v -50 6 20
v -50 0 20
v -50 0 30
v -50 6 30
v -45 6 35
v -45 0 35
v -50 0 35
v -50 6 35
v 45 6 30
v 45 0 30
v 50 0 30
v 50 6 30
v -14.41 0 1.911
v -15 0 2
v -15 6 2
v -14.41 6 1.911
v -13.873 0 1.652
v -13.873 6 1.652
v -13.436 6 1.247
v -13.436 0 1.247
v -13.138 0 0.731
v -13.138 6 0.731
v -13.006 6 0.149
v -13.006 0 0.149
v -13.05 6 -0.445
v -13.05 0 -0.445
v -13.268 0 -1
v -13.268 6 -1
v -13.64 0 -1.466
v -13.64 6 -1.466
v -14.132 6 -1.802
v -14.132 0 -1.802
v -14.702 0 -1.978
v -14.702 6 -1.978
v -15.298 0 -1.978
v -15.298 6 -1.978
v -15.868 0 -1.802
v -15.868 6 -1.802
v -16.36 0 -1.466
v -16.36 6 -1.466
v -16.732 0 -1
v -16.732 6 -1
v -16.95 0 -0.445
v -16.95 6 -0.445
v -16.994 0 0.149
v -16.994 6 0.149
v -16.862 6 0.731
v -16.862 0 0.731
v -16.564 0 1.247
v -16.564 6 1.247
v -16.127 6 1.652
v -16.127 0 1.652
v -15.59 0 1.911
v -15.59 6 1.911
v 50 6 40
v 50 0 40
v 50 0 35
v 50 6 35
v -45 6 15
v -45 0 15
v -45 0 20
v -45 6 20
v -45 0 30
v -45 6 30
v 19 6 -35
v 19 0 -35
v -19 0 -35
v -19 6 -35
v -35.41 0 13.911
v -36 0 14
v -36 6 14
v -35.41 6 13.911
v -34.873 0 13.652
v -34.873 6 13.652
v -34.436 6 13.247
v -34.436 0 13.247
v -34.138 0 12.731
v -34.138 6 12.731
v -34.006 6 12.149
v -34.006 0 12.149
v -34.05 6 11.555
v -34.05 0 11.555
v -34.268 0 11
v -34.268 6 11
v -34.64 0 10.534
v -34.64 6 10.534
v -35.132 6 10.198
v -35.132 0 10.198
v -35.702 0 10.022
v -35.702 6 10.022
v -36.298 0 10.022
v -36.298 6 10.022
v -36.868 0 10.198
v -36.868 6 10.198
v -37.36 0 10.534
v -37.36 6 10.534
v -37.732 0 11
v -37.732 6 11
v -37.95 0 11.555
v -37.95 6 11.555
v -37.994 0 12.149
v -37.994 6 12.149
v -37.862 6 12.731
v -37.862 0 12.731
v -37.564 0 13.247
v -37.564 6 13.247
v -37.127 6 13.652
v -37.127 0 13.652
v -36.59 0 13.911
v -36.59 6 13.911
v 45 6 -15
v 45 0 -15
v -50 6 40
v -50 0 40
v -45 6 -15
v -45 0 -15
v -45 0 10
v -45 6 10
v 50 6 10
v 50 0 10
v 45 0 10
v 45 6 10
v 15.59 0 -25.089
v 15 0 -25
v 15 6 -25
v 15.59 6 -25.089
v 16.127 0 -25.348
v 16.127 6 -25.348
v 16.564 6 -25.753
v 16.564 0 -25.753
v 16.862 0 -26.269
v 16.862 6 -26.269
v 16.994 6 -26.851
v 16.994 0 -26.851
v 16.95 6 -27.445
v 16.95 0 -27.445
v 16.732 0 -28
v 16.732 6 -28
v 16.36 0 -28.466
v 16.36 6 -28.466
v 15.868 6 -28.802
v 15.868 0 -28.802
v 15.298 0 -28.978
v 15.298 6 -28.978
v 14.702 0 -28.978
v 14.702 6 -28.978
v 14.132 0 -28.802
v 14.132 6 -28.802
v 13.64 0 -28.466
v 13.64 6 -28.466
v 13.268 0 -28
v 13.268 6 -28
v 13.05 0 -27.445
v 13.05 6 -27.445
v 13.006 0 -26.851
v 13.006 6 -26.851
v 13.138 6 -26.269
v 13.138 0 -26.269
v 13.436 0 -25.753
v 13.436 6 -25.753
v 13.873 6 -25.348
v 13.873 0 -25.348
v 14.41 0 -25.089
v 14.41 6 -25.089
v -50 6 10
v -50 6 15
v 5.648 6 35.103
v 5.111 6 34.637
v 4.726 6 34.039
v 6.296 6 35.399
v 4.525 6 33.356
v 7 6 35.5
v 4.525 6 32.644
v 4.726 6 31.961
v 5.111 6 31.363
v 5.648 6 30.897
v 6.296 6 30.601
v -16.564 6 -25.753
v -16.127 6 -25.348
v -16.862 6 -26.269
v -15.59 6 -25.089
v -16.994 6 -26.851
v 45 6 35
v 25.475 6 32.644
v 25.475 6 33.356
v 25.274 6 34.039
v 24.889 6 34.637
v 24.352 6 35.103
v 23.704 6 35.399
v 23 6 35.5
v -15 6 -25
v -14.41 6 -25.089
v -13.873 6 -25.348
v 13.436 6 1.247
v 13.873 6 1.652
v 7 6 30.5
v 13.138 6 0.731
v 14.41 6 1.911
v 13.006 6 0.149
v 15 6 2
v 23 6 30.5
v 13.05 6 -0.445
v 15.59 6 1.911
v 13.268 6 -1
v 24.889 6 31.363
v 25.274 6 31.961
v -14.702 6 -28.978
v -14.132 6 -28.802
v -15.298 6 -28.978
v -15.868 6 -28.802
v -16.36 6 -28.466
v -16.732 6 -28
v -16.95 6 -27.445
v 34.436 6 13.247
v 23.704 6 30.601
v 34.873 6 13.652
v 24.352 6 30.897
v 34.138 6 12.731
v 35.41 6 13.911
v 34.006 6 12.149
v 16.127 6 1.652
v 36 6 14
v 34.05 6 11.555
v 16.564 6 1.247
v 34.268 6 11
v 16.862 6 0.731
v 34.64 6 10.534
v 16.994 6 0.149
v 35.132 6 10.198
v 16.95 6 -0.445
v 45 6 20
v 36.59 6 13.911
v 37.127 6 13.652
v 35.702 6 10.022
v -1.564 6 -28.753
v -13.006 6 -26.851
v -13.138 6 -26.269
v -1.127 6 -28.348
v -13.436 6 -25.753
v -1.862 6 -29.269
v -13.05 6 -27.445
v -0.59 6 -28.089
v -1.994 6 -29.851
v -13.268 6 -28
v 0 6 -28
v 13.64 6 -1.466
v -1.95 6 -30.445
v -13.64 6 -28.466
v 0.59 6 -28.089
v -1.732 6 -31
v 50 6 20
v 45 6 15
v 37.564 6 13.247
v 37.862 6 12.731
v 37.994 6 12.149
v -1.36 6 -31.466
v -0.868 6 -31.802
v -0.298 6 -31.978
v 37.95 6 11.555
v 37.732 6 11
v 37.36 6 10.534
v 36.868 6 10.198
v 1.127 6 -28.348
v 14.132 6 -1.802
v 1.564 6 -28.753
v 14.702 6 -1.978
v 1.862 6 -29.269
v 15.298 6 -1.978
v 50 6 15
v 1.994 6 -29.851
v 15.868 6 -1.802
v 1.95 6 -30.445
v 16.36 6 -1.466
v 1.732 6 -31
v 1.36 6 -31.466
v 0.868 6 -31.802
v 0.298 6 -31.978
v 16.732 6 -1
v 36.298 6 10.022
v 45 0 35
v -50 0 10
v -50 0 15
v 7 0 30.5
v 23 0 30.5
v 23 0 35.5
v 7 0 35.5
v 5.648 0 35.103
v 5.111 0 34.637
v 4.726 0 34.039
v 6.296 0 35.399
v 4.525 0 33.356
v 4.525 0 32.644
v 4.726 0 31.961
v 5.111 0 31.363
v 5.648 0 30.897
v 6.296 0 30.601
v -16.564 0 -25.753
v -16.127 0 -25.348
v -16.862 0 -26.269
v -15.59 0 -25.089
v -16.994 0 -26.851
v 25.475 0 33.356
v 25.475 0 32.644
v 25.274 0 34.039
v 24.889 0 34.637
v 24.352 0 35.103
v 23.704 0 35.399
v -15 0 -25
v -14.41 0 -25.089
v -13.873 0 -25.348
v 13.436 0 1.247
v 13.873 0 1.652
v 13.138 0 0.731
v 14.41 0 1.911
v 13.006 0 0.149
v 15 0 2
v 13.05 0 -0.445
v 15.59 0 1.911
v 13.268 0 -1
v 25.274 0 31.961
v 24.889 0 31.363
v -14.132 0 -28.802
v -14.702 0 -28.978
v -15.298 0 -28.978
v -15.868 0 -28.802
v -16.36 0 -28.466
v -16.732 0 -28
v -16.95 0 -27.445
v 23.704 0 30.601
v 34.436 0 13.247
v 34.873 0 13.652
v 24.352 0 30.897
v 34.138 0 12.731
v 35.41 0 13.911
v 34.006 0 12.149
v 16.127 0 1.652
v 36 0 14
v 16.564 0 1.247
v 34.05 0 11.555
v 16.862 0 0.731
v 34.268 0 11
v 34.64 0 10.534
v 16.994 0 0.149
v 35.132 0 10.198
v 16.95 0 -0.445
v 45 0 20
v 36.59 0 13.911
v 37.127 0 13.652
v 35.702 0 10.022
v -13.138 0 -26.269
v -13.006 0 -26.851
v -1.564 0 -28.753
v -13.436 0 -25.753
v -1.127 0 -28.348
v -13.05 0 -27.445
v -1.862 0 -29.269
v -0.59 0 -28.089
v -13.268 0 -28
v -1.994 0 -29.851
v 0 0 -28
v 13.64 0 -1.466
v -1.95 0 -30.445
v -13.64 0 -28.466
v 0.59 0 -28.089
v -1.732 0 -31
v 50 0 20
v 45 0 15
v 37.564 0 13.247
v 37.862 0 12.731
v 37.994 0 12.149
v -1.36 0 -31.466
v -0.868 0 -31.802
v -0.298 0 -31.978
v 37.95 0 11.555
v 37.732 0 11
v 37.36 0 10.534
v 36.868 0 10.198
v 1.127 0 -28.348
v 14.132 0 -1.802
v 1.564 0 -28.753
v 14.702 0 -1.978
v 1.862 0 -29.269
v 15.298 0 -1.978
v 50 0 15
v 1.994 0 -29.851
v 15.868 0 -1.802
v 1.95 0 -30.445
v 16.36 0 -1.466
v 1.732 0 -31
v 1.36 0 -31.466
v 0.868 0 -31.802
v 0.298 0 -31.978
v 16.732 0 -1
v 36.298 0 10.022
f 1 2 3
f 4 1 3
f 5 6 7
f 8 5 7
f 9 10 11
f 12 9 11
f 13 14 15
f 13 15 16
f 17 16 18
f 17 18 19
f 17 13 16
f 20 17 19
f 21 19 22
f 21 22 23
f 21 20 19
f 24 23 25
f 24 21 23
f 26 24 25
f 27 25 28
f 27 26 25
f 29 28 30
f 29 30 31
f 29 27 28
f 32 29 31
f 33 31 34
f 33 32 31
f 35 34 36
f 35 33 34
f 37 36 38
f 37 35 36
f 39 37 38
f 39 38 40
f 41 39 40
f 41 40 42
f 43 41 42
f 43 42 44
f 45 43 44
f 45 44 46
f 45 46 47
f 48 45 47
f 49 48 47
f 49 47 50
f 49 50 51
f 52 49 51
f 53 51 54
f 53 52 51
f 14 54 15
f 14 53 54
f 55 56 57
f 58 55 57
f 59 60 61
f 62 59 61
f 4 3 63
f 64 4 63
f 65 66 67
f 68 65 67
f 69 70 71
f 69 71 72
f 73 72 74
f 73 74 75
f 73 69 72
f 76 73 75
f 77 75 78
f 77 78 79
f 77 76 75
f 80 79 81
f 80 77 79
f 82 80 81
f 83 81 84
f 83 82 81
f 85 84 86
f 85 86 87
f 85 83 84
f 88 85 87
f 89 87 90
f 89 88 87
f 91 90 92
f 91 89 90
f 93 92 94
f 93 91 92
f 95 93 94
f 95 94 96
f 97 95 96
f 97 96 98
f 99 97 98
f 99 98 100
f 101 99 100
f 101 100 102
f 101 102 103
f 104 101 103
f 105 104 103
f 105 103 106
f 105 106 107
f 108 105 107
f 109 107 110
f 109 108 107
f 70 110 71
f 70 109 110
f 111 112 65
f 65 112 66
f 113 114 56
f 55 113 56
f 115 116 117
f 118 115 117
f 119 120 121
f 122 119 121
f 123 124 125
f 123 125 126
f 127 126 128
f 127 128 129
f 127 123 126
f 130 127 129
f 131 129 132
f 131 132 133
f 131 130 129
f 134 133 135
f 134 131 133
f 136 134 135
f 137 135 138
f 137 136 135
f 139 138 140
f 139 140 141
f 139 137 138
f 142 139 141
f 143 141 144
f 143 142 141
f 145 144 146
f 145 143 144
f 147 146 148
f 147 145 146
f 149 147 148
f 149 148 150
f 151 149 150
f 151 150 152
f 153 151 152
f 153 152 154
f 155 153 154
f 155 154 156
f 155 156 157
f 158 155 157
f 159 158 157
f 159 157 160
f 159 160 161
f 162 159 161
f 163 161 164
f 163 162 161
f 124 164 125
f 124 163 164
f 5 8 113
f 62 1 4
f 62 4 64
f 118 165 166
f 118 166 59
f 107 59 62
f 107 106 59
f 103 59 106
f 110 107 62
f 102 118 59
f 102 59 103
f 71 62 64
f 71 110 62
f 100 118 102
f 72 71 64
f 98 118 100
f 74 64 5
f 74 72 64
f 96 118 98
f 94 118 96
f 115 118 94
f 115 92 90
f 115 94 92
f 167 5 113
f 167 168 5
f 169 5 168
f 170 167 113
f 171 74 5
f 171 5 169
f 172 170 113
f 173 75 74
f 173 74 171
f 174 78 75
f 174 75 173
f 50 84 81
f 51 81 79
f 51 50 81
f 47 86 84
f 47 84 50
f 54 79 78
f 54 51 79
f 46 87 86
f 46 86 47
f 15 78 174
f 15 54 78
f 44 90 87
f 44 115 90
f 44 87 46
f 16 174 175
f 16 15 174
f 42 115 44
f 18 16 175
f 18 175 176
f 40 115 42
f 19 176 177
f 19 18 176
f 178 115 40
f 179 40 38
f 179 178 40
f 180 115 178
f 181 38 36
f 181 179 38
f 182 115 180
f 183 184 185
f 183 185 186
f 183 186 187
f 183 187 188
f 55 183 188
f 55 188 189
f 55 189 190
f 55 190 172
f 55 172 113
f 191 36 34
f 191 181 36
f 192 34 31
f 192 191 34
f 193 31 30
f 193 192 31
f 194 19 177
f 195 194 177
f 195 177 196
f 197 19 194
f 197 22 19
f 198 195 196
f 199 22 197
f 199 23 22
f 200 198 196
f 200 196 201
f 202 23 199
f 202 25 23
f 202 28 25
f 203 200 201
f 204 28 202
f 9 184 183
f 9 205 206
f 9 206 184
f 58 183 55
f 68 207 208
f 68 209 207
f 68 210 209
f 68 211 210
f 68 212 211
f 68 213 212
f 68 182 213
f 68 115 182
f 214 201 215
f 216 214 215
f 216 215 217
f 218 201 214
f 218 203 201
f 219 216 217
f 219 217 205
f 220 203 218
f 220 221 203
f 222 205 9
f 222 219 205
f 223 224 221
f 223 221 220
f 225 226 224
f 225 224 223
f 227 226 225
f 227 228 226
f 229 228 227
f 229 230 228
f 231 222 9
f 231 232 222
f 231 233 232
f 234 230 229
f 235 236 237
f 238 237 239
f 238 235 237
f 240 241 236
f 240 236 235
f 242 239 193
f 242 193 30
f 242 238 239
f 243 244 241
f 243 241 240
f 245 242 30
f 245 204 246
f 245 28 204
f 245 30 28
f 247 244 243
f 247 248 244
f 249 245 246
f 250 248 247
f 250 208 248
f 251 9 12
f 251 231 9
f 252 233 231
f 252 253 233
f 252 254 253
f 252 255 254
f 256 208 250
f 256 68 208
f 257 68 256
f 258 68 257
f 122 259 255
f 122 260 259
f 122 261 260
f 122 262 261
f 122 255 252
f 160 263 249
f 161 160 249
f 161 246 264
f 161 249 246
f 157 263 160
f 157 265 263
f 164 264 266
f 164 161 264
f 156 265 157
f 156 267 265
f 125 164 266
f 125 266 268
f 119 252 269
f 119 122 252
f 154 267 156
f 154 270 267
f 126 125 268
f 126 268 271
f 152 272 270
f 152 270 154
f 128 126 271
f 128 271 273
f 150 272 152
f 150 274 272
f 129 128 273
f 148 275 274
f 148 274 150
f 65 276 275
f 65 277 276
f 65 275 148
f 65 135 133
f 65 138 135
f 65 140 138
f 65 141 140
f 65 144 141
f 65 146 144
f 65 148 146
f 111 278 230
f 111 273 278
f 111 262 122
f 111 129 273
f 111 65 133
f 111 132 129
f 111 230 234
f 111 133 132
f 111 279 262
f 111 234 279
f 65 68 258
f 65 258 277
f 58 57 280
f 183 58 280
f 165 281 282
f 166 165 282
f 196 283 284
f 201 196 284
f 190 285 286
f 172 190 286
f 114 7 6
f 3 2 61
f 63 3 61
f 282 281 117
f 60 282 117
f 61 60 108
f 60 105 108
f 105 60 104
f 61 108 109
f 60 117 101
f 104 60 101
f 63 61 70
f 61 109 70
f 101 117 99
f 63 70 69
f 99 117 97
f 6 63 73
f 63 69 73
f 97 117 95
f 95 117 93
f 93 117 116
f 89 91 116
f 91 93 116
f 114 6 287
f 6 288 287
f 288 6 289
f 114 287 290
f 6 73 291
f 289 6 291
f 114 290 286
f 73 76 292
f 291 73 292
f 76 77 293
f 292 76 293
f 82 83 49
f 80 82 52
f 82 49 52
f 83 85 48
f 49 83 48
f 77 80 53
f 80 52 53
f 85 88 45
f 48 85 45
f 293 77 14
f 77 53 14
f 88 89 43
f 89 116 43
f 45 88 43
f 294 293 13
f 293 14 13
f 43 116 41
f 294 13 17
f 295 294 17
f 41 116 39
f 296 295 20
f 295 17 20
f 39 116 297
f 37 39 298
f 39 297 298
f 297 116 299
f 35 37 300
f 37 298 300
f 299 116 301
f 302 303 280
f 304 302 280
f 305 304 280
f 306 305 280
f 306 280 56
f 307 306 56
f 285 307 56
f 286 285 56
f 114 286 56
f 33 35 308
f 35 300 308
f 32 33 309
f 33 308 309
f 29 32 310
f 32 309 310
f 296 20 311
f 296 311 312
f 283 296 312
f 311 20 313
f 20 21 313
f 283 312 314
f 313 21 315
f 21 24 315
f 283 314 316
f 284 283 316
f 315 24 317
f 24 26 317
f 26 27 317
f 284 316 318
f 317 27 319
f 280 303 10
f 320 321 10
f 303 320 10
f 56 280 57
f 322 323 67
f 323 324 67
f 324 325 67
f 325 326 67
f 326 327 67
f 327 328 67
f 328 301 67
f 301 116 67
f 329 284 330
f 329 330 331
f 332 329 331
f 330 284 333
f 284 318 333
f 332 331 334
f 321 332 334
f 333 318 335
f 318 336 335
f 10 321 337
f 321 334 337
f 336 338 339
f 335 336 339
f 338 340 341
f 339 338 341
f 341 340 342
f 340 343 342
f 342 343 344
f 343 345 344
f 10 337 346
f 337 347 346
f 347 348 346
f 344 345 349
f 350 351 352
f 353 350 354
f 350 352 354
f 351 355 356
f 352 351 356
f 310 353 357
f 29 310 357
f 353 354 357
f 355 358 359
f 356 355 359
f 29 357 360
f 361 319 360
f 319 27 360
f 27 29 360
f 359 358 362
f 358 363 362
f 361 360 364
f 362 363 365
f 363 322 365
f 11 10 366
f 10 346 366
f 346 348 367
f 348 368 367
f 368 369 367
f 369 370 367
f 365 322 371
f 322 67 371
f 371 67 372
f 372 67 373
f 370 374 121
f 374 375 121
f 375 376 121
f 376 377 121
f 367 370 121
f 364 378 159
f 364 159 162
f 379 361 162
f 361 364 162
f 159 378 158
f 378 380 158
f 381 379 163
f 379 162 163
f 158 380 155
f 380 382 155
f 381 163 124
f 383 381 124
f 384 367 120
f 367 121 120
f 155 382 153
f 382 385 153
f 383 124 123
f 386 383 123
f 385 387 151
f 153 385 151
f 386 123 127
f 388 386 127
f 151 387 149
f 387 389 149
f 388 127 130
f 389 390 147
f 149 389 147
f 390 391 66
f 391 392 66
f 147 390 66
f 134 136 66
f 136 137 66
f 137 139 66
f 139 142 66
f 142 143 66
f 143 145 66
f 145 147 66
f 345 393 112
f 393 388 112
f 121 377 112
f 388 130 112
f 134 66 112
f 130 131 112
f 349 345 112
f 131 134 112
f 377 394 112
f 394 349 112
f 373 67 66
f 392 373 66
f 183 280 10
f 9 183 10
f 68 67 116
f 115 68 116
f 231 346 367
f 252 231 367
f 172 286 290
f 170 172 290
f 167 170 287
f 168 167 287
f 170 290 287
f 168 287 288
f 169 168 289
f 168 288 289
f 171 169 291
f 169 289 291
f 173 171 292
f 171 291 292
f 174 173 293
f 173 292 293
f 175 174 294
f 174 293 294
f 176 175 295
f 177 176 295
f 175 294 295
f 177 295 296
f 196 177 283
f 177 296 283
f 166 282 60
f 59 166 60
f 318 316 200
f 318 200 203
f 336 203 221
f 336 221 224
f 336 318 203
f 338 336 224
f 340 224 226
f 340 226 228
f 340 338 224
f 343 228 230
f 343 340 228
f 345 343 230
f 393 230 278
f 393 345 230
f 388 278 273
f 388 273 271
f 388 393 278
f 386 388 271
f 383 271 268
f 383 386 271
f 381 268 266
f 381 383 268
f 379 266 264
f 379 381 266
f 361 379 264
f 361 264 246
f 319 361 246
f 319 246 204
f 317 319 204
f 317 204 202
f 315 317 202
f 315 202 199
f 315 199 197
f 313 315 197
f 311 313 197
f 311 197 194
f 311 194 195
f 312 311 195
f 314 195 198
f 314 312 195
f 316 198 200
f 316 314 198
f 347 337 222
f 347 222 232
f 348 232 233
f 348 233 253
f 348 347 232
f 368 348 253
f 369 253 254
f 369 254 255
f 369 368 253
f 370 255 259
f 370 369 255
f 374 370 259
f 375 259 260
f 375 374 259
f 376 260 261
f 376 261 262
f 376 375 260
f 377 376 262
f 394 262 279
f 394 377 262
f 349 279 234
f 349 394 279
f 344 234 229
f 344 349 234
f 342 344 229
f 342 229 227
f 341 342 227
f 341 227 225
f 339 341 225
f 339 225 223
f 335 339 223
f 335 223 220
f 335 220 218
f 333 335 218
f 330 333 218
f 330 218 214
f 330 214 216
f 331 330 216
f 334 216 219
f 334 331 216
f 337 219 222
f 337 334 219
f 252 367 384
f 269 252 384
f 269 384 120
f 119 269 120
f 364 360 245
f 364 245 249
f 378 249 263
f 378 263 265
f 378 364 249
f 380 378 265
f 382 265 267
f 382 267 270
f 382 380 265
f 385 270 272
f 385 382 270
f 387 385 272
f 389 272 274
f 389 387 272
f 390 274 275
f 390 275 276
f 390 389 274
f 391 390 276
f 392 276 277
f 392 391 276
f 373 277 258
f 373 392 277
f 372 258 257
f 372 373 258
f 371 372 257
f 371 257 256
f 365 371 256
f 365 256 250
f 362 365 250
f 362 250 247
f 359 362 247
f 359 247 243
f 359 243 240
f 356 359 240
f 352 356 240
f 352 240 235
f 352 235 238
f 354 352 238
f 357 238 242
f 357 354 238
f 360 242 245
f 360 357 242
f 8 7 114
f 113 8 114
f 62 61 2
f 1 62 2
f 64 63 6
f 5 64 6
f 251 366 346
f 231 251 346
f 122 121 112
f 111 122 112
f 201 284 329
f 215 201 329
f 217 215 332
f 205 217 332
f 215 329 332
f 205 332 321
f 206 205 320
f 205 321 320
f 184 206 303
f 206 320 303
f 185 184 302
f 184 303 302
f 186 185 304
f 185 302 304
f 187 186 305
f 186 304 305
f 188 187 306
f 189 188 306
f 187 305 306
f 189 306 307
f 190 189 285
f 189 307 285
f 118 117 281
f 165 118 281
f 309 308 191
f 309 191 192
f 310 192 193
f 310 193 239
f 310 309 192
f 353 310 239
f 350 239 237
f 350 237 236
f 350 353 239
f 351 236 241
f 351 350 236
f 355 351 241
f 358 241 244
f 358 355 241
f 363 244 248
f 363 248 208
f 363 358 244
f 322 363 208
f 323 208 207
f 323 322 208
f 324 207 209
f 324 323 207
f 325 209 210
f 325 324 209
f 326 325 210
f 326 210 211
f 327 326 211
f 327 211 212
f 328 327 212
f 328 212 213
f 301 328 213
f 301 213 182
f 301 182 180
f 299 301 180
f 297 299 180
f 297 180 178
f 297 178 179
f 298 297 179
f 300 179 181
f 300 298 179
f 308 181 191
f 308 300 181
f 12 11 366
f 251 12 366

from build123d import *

# Parameters (mm, degrees)
SKETCH1_R           = 2
BOSS_EXTRUDE1_DEPTH = 6


with BuildPart() as part:
    # Sketch1 → Boss-Extrude1 (new body)
    with BuildSketch(Plane(origin=(0, 0, 0), x_dir=(1, 0, 0), z_dir=(0, 1, 0))):
        Polygon((-45, 15), (-45, -10), (-50, -10), (-50, -15), (-45, -15), (-45, -20), (-50, -20), (-50, -30), (-45, -30), (-45, -35), (-50, -35), (-50, -40), (-45, -40), (45, -40), (50, -40), (50, -35), (45, -35), (45, -33), (45, -30), (50, -30), (50, -20), (45, -20), (45, -15), (50, -15), (50, -10), (45, -10), (45, 15), (19, 35), (-19, 35), align=None)
        with Locations(Location((15, 0, 0), (0, 0, 270))):
            Circle(SKETCH1_R, mode=Mode.SUBTRACT)
        with Locations(Location((-15, 0, 0), (0, 0, 270))):
            Circle(SKETCH1_R, mode=Mode.SUBTRACT)
        with Locations(Location((15, 27, 0), (0, 0, 270))):
            Circle(SKETCH1_R, mode=Mode.SUBTRACT)
        with Locations(Location((-15, 27, 0), (0, 0, 270))):
            Circle(SKETCH1_R, mode=Mode.SUBTRACT)
        with Locations(Location((0, 30, 0), (0, 0, 270))):
            Circle(SKETCH1_R, mode=Mode.SUBTRACT)
        with Locations(Location((-36, -12, 0), (0, 0, 270))):
            Circle(SKETCH1_R, mode=Mode.SUBTRACT)
        with Locations(Location((36, -12, 0), (0, 0, 270))):
            Circle(SKETCH1_R, mode=Mode.SUBTRACT)
        with BuildLine():
            Line((7, -30.5), (23, -30.5))
            ThreePointArc((23, -30.5), (25.5, -33), (23, -35.5))
            Line((23, -35.5), (7, -35.5))
            ThreePointArc((7, -35.5), (4.5, -33), (7, -30.5))
        make_face(mode=Mode.SUBTRACT)
    extrude(amount=BOSS_EXTRUDE1_DEPTH)


solid = part.part
